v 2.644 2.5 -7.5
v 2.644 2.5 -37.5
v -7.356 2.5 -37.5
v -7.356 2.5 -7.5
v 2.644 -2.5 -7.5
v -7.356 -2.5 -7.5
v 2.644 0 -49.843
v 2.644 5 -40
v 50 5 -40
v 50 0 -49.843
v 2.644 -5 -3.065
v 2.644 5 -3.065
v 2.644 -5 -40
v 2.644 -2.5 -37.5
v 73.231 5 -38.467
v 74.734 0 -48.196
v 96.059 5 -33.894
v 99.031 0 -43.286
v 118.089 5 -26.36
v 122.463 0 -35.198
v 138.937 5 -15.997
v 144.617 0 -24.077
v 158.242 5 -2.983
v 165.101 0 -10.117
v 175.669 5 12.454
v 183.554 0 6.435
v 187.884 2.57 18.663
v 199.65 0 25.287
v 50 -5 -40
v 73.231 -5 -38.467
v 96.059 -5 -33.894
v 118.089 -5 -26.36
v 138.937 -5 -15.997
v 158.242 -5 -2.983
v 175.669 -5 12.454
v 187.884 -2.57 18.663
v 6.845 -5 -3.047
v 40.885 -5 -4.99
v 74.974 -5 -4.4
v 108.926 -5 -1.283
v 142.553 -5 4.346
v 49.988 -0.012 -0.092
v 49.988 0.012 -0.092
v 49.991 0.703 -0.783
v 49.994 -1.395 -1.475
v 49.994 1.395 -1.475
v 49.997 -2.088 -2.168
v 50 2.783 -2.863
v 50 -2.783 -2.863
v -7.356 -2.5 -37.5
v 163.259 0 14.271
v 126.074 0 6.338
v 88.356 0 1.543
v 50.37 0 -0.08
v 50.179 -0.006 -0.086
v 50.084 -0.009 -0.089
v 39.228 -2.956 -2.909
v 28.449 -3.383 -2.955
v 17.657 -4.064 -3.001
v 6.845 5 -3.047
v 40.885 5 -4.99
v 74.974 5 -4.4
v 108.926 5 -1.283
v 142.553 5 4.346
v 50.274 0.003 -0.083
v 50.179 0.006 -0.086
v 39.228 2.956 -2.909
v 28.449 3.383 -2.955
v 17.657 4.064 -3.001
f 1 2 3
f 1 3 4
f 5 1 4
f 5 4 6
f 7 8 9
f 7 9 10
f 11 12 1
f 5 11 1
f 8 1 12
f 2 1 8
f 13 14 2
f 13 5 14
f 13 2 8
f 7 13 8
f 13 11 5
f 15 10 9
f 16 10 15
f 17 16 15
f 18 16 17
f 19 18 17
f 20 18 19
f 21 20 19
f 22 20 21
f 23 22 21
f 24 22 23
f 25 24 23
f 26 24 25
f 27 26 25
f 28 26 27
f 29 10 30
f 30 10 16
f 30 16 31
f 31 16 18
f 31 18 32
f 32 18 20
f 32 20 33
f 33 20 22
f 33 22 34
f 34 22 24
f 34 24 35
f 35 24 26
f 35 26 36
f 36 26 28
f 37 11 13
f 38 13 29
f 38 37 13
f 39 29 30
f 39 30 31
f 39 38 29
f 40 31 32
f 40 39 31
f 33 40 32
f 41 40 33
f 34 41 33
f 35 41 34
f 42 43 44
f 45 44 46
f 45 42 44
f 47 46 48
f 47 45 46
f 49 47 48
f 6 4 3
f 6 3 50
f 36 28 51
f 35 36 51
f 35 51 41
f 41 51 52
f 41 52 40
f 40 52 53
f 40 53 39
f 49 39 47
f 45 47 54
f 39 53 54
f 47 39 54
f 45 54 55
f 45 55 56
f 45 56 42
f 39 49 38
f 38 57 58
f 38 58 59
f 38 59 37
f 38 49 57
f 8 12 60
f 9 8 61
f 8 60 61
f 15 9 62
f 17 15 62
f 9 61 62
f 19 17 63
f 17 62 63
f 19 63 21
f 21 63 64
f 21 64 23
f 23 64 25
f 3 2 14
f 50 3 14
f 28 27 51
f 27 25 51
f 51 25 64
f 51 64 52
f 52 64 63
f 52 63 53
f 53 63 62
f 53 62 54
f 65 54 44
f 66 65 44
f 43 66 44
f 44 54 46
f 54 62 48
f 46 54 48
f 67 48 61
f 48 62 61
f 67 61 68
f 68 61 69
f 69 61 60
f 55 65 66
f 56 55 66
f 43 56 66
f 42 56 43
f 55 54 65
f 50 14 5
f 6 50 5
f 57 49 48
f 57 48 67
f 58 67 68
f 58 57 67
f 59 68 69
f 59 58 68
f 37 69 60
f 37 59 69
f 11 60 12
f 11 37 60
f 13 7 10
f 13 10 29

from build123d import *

# Parameters (mm, degrees)
F1_DEPTH    = 5
F2_DEPTH    = 5
F3_T2_ANGLE = 28.7632092252
F3_T4_ANGLE = 28.7632092252
F4_T1_DEPTH = 73.2511453801
F4_T4_ANGLE = 58.5309171072
F4_T6_ANGLE = 58.5309171072
F5_W        = 5
F5_H        = 30
F6_DEPTH    = 10


# Not quite as in the source:
# - a fillet or chamfer that OpenCascade refuses, or shapes differently, is made with other operations: its cross-section is extruded or revolved along the edge and cut away or added


with BuildPart() as f1:
    # F0 (on Front) → F1 (new body, symmetric)
    with BuildSketch(Plane.XZ):
        with BuildLine():
            Line((2.6443716172, -3.0652818078), (2.6443716172, -47.137426524))
            Line((2.6443716172, -47.137426524), (50, -47.137426524))
            ThreePointArc((50, -47.137426524), (128.4023811423, -29.5875675392), (191.8408584792, 19.7124376571))
            ThreePointArc((191.8408584792, 19.7124376571), (121.8130563717, 2.8164742266), (50, -2.862573476))
            Line((50, -2.862573476), (2.6443716172, -3.0652818078))
        make_face()
    extrude(amount=F1_DEPTH, both=True)

    # F0 (on Front) → F2 (join, symmetric)
    with BuildSketch(Plane.XZ):
        with BuildLine():
            Line((2.6443716172, -50), (50, -50))
            ThreePointArc((50, -50), (133.9633393999, -30.0622505081), (200, 25.494168336))
            ThreePointArc((200, 25.494168336), (127.7176805201, 6.7011176968), (53.3323914074, 0.0122294972))
            Line((53.3323914074, 0.0122294972), (50, -2.862573476))
            ThreePointArc((50, -2.862573476), (121.8130563717, 2.8164742266), (191.8408584792, 19.7124376571))
            ThreePointArc((191.8408584792, 19.7124376571), (128.4023811423, -29.5875675392), (50, -47.137426524))
            Line((50, -47.137426524), (2.6443716172, -47.137426524))
            Line((2.6443716172, -47.137426524), (2.6443716172, -50))
        make_face()
        Polygon((50, -2.862573476), (53.3323914074, 0.0122294972), (49.9881391504, -0.0917057033), align=None)
        with BuildLine():
            Line((2.6443716172, -3.0652818078), (2.6443716172, -47.137426524))
            Line((2.6443716172, -47.137426524), (50, -47.137426524))
            ThreePointArc((50, -47.137426524), (128.4023811423, -29.5875675392), (191.8408584792, 19.7124376571))
            ThreePointArc((191.8408584792, 19.7124376571), (121.8130563717, 2.8164742266), (50, -2.862573476))
            Line((50, -2.862573476), (2.6443716172, -3.0652818078))
        make_face()
    extrude(amount=F2_DEPTH, both=True)

    # F3: chamfer of 5.08 on 2 edges, made by hand

    # F3_s1 → F3_t2 (revolve, cut)
    with BuildSketch(Plane(origin=(195.1630456204, 0, 74.6833379712), x_dir=(0, 1, 0), z_dir=(0.9339525469, 0, 0.3573970343))):
        Polygon((-5, -52.9370117112), (0.08, -47.8570117112), (-5, -47.8570117112), align=None)
    revolve(axis=Axis((50, -5, 454.0244716756), (0, 1, 0)), revolution_arc=F3_T2_ANGLE, mode=Mode.SUBTRACT)

    # F3_s3 → F3_t4 (revolve, cut)
    with BuildSketch(Plane(origin=(195.1630456204, 0, 74.6833379712), x_dir=(0, 1, 0), z_dir=(0.9339525469, 0, 0.3573970343))):
        Polygon((-0.08, -47.8570117112), (5, -52.9370117112), (5, -47.8570117112), align=None)
    revolve(axis=Axis((50, 5, 454.0244716756), (0, 1, 0)), revolution_arc=F3_T4_ANGLE, mode=Mode.SUBTRACT)

    # F4: chamfer of 5.08 x 10 on 2 edges, made by hand

    # F4_s2 → F4_t1 (cut)
    with BuildSketch(Plane.YZ.offset(-23.2511453801)):
        Polygon((0.08, -50), (-5, -40), (-5, -50), align=None)
        Polygon((5, -40), (-0.08, -50), (5, -50), align=None)
    extrude(amount=F4_T1_DEPTH, mode=Mode.SUBTRACT)

    # F4_s3 → F4_t4 (revolve, cut)
    with BuildSketch(Plane.YZ.offset(50)):
        Polygon((5, -40), (-0.08, -50), (5, -50), align=None)
    revolve(axis=Axis((50, 5, 136.7652169319), (0, -1, 0)), revolution_arc=F4_T4_ANGLE, mode=Mode.SUBTRACT)

    # F4_s5 → F4_t6 (revolve, cut)
    with BuildSketch(Plane.YZ.offset(50)):
        Polygon((-5, -40), (0.08, -50), (-5, -50), align=None)
    revolve(axis=Axis((50, -5, 136.7652169319), (0, -1, 0)), revolution_arc=F4_T6_ANGLE, mode=Mode.SUBTRACT)

    # F5 (on face) → F6 (join)
    with BuildSketch(Plane(origin=(2.6443716172, 0, 0), x_dir=(0, -1, 0), z_dir=(-1, 0, 0))):
        with Locations((0, -22.5)):
            Rectangle(F5_W, F5_H)
    extrude(amount=F6_DEPTH)


solid = f1.part
